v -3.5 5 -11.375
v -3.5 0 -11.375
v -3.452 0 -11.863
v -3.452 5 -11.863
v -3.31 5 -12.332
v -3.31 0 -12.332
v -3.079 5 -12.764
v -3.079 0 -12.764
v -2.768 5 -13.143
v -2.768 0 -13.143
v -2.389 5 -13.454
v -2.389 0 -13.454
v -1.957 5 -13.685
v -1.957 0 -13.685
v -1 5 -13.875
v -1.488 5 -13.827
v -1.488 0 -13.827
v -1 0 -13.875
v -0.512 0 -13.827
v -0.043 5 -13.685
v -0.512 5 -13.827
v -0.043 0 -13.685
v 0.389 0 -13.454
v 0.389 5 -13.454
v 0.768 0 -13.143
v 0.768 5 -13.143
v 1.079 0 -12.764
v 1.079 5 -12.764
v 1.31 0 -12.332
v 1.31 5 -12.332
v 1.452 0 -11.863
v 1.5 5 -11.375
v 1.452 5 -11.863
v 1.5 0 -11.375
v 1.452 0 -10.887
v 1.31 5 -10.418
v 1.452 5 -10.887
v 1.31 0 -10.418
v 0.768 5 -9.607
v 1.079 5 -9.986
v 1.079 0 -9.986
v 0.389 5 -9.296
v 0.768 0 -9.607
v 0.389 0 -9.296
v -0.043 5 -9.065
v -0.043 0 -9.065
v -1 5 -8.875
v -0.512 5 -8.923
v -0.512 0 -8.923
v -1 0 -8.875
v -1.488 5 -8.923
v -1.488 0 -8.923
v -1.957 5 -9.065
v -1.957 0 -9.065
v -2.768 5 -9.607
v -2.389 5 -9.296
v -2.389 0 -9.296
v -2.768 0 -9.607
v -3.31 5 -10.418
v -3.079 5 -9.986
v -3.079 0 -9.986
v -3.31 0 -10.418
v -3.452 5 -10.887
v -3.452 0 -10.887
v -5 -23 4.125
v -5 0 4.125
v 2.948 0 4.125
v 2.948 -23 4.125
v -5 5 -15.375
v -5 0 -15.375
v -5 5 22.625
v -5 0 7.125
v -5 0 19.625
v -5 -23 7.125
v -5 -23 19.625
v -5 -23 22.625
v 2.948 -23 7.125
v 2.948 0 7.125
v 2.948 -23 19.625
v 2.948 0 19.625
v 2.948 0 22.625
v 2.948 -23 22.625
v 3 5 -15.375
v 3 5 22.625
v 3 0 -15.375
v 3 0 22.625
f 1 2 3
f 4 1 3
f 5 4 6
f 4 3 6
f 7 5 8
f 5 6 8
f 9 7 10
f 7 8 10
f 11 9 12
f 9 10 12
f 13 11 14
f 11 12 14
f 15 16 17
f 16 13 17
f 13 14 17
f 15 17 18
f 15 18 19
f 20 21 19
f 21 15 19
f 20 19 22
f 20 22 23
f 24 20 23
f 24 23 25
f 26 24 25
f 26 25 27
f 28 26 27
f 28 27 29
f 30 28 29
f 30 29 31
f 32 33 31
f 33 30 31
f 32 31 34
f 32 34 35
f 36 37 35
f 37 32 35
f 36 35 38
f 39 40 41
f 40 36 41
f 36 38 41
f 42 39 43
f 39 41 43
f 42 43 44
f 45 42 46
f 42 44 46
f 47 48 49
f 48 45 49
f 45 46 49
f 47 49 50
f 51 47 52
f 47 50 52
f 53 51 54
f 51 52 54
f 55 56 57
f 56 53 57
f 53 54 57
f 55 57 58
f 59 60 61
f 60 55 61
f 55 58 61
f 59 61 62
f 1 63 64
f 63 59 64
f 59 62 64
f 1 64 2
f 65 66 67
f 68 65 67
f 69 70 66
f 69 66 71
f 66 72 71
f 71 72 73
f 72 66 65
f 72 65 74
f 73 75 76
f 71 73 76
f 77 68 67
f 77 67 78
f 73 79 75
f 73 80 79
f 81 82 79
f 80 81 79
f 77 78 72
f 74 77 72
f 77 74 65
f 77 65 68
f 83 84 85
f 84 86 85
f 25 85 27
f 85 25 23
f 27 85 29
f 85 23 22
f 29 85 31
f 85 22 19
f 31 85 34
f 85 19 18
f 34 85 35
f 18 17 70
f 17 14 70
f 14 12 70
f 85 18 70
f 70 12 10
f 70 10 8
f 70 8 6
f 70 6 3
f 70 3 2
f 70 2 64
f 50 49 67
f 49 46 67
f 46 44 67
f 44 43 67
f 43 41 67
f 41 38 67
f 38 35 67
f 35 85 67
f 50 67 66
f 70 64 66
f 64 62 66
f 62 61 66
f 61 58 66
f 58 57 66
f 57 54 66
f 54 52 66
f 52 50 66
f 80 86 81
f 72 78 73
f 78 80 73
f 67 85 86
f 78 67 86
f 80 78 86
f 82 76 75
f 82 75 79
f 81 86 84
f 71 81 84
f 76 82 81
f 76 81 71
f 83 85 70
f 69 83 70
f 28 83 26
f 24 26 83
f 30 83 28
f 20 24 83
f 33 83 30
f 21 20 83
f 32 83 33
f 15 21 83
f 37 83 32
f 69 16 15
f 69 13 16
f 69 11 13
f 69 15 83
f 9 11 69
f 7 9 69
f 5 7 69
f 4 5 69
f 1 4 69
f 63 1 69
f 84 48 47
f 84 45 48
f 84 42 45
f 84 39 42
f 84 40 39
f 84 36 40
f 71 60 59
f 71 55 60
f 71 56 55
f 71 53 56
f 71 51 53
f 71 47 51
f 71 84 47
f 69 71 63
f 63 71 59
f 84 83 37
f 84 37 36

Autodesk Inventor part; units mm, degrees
ref_plane "YZ Plane" through (0, 0, 0) normal (1, 0, 0) x (0, 1, 0)
ref_plane "XZ Plane" through (0, 0, 0) normal (0, 1, 0) x (-1, 0, 0)
ref_plane "XY Plane" through (0, 0, 0) normal (0, 0, 1) x (1, 0, 0)
sketch "Sketch1" plane through (0, 0, 0) normal (0, 1, 0) x (-1, 0, 0)
  point P0 (0, 0)
sketch "Sketch2" plane through (-2.6971, 0, -13.0721) normal (0, 1, 0) x (-1, 0, 0)
  circle A0 centre (-1.6971, 1.6971) radius 2.5
  line L0 (2.3029, 5.6971) -> (-5.6971, 5.6971)
  line L1 (-5.6971, 5.6971) -> (-5.6971, -2.3029)
  line L2 (-5.6971, -2.3029) -> (2.3029, -2.3029)
  line L3 (2.3029, -2.3029) -> (2.3029, 5.6971)
  line L4 (2.3029, 5.6971) -> (-5.6971, -2.3029) construction
  line L5 (-5.6971, 5.6971) -> (2.3029, -2.3029) construction
  line L6 (2.3029, 5.6971) -> (-5.6971, 5.6971)
  line L7 (-5.6971, 5.6971) -> (-5.6971, 35.6971)
  line L8 (-5.6971, 35.6971) -> (2.3029, 35.6971)
  line L9 (2.3029, 35.6971) -> (2.3029, 5.6971)
  point P0 (-7.6971, -4.5529)
  dimension "d3" = 5
  dimension "d1" = 8
  dimension "d2" = 8
  dimension "d0" = 30
extrude "Extrusion1" add sketch "Sketch2" along normal blind 5
sketch "Sketch3" plane through (-2.6971, 0, -13.0721) normal (0, -1, 0) x (1, 0, 0)
  line L0 (-2.3029, -2.3029) -> (-2.3029, 35.6971) projected
  line L1 (5.6449, 20.1971) -> (-2.3029, 20.1971)
  line L2 (-2.3029, 20.1971) -> (-2.3029, 17.1971)
  line L3 (-2.3029, 17.1971) -> (5.6449, 17.1971)
  line L4 (5.6449, 17.1971) -> (5.6449, 20.1971)
  line L5 (5.6449, 32.6971) -> (-2.3029, 32.6971)
  line L6 (-2.3029, 32.6971) -> (-2.3029, 35.6971)
  line L7 (-2.3029, 35.6971) -> (5.6449, 35.6971)
  line L8 (5.6449, 35.6971) -> (5.6449, 32.6971)
  point P0 (2.6971, 13.0721)
  dimension "d7" = 3
  dimension "d11" = 12.5
  dimension "d12" = 3
extrude "Extrusion2" add sketch "Sketch3" along normal blind 23
sketch "Sketch4" plane through (-5, 0, -15.375) normal (-1, 0, 0) x (0, 0, 1)
  point P0 (15.375, 0)
properties part number "A1"
